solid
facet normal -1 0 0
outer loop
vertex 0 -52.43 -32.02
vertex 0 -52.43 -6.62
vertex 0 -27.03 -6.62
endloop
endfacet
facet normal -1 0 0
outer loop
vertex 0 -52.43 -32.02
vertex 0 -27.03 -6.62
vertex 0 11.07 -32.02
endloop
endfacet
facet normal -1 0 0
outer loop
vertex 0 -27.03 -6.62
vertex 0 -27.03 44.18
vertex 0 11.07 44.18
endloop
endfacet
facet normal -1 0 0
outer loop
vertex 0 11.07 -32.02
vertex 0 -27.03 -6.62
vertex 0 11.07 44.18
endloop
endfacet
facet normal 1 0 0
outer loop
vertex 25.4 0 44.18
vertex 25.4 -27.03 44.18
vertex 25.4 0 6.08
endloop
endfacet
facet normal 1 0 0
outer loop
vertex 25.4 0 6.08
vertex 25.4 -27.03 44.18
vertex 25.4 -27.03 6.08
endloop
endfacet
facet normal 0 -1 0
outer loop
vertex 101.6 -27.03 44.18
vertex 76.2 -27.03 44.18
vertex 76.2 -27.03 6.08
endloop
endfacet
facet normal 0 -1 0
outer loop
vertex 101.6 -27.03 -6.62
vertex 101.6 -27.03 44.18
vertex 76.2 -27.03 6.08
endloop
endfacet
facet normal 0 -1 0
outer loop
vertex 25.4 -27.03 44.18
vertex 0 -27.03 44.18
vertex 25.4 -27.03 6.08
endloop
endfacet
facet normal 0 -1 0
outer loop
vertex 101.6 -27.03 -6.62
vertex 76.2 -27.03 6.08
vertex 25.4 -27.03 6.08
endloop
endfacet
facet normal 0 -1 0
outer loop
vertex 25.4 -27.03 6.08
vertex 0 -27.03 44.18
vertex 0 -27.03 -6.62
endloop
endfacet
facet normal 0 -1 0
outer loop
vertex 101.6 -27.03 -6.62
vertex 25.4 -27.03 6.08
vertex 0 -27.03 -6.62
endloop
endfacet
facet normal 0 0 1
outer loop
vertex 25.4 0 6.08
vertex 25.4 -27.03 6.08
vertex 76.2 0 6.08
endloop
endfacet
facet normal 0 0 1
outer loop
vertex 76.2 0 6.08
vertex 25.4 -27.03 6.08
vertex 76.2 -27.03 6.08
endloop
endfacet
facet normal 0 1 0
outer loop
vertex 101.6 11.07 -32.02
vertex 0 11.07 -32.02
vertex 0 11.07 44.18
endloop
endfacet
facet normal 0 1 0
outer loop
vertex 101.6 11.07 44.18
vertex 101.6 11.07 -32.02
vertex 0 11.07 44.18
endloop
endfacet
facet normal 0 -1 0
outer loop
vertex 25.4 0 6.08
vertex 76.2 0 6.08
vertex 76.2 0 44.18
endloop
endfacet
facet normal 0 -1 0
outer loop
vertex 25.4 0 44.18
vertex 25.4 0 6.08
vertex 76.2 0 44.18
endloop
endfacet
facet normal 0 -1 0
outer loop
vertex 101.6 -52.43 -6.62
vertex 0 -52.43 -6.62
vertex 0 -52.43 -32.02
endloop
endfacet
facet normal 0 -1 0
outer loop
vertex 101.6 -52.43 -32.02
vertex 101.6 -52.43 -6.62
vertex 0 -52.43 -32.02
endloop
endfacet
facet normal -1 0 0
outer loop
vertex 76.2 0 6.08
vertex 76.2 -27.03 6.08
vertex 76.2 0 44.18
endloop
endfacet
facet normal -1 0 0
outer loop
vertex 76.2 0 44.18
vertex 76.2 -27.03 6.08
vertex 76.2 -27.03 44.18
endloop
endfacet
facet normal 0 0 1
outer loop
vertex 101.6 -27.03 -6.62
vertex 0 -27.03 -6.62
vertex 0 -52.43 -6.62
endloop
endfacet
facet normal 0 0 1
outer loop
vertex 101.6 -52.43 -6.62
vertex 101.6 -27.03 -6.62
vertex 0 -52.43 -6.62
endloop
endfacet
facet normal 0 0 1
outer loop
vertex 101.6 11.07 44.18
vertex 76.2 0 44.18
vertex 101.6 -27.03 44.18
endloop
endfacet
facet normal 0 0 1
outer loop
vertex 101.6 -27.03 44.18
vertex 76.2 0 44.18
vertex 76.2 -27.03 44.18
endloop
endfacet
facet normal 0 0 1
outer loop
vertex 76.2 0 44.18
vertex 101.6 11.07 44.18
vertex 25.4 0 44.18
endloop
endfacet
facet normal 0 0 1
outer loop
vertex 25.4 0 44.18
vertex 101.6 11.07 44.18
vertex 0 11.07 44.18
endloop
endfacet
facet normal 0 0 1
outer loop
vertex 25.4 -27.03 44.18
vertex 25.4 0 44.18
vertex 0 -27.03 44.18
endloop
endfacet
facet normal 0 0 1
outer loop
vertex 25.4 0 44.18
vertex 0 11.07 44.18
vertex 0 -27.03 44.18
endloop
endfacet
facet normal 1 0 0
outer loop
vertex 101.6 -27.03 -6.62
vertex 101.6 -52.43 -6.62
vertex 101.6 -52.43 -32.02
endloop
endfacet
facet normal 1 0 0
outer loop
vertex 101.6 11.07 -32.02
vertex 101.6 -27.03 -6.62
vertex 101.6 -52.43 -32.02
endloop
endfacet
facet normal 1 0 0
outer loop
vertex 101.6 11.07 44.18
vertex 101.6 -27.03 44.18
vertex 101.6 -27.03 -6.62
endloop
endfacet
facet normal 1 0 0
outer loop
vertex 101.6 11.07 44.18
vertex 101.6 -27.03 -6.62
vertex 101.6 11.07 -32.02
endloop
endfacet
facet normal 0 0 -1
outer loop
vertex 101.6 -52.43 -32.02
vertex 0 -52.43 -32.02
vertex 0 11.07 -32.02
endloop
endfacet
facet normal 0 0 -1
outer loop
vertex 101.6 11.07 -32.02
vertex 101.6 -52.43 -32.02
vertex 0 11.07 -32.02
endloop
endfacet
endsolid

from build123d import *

# Parameters (mm, degrees)
F1_DEPTH = 101.6
F3_DEPTH = 130.048
F4_W     = 11.070052
F4_H     = 38.1
F5_DEPTH = 60.198


with BuildPart() as f1:
    # F0 (on Right) → F1 (new body)
    with BuildSketch(Plane.YZ):
        Polygon((11.070052, 44.179608), (-27.029948, 44.179608), (-27.029948, -6.620392), (-52.429948, -6.620392), (-52.429948, -32.020392), (11.070052, -32.020392), align=None)
    extrude(amount=F1_DEPTH)

    # F2 (on face) → F3 (cut)
    with BuildSketch(Plane.XZ.offset(27.029948)):
        Polygon((76.2, 44.179608), (50.8, 44.179608), (25.4, 44.179608), (25.4, 6.079608), (76.2, 6.079608), align=None)
    extrude(amount=-F3_DEPTH, mode=Mode.SUBTRACT)

    # F4 (on face) → F5 (join)
    with BuildSketch(Plane(origin=(76.2, 0, 0), x_dir=(0, -1, 0), z_dir=(-1, 0, 0))):
        with Locations((-5.535026, 25.129608)):
            Rectangle(F4_W, F4_H)
    extrude(amount=F5_DEPTH)


solid = f1.part
